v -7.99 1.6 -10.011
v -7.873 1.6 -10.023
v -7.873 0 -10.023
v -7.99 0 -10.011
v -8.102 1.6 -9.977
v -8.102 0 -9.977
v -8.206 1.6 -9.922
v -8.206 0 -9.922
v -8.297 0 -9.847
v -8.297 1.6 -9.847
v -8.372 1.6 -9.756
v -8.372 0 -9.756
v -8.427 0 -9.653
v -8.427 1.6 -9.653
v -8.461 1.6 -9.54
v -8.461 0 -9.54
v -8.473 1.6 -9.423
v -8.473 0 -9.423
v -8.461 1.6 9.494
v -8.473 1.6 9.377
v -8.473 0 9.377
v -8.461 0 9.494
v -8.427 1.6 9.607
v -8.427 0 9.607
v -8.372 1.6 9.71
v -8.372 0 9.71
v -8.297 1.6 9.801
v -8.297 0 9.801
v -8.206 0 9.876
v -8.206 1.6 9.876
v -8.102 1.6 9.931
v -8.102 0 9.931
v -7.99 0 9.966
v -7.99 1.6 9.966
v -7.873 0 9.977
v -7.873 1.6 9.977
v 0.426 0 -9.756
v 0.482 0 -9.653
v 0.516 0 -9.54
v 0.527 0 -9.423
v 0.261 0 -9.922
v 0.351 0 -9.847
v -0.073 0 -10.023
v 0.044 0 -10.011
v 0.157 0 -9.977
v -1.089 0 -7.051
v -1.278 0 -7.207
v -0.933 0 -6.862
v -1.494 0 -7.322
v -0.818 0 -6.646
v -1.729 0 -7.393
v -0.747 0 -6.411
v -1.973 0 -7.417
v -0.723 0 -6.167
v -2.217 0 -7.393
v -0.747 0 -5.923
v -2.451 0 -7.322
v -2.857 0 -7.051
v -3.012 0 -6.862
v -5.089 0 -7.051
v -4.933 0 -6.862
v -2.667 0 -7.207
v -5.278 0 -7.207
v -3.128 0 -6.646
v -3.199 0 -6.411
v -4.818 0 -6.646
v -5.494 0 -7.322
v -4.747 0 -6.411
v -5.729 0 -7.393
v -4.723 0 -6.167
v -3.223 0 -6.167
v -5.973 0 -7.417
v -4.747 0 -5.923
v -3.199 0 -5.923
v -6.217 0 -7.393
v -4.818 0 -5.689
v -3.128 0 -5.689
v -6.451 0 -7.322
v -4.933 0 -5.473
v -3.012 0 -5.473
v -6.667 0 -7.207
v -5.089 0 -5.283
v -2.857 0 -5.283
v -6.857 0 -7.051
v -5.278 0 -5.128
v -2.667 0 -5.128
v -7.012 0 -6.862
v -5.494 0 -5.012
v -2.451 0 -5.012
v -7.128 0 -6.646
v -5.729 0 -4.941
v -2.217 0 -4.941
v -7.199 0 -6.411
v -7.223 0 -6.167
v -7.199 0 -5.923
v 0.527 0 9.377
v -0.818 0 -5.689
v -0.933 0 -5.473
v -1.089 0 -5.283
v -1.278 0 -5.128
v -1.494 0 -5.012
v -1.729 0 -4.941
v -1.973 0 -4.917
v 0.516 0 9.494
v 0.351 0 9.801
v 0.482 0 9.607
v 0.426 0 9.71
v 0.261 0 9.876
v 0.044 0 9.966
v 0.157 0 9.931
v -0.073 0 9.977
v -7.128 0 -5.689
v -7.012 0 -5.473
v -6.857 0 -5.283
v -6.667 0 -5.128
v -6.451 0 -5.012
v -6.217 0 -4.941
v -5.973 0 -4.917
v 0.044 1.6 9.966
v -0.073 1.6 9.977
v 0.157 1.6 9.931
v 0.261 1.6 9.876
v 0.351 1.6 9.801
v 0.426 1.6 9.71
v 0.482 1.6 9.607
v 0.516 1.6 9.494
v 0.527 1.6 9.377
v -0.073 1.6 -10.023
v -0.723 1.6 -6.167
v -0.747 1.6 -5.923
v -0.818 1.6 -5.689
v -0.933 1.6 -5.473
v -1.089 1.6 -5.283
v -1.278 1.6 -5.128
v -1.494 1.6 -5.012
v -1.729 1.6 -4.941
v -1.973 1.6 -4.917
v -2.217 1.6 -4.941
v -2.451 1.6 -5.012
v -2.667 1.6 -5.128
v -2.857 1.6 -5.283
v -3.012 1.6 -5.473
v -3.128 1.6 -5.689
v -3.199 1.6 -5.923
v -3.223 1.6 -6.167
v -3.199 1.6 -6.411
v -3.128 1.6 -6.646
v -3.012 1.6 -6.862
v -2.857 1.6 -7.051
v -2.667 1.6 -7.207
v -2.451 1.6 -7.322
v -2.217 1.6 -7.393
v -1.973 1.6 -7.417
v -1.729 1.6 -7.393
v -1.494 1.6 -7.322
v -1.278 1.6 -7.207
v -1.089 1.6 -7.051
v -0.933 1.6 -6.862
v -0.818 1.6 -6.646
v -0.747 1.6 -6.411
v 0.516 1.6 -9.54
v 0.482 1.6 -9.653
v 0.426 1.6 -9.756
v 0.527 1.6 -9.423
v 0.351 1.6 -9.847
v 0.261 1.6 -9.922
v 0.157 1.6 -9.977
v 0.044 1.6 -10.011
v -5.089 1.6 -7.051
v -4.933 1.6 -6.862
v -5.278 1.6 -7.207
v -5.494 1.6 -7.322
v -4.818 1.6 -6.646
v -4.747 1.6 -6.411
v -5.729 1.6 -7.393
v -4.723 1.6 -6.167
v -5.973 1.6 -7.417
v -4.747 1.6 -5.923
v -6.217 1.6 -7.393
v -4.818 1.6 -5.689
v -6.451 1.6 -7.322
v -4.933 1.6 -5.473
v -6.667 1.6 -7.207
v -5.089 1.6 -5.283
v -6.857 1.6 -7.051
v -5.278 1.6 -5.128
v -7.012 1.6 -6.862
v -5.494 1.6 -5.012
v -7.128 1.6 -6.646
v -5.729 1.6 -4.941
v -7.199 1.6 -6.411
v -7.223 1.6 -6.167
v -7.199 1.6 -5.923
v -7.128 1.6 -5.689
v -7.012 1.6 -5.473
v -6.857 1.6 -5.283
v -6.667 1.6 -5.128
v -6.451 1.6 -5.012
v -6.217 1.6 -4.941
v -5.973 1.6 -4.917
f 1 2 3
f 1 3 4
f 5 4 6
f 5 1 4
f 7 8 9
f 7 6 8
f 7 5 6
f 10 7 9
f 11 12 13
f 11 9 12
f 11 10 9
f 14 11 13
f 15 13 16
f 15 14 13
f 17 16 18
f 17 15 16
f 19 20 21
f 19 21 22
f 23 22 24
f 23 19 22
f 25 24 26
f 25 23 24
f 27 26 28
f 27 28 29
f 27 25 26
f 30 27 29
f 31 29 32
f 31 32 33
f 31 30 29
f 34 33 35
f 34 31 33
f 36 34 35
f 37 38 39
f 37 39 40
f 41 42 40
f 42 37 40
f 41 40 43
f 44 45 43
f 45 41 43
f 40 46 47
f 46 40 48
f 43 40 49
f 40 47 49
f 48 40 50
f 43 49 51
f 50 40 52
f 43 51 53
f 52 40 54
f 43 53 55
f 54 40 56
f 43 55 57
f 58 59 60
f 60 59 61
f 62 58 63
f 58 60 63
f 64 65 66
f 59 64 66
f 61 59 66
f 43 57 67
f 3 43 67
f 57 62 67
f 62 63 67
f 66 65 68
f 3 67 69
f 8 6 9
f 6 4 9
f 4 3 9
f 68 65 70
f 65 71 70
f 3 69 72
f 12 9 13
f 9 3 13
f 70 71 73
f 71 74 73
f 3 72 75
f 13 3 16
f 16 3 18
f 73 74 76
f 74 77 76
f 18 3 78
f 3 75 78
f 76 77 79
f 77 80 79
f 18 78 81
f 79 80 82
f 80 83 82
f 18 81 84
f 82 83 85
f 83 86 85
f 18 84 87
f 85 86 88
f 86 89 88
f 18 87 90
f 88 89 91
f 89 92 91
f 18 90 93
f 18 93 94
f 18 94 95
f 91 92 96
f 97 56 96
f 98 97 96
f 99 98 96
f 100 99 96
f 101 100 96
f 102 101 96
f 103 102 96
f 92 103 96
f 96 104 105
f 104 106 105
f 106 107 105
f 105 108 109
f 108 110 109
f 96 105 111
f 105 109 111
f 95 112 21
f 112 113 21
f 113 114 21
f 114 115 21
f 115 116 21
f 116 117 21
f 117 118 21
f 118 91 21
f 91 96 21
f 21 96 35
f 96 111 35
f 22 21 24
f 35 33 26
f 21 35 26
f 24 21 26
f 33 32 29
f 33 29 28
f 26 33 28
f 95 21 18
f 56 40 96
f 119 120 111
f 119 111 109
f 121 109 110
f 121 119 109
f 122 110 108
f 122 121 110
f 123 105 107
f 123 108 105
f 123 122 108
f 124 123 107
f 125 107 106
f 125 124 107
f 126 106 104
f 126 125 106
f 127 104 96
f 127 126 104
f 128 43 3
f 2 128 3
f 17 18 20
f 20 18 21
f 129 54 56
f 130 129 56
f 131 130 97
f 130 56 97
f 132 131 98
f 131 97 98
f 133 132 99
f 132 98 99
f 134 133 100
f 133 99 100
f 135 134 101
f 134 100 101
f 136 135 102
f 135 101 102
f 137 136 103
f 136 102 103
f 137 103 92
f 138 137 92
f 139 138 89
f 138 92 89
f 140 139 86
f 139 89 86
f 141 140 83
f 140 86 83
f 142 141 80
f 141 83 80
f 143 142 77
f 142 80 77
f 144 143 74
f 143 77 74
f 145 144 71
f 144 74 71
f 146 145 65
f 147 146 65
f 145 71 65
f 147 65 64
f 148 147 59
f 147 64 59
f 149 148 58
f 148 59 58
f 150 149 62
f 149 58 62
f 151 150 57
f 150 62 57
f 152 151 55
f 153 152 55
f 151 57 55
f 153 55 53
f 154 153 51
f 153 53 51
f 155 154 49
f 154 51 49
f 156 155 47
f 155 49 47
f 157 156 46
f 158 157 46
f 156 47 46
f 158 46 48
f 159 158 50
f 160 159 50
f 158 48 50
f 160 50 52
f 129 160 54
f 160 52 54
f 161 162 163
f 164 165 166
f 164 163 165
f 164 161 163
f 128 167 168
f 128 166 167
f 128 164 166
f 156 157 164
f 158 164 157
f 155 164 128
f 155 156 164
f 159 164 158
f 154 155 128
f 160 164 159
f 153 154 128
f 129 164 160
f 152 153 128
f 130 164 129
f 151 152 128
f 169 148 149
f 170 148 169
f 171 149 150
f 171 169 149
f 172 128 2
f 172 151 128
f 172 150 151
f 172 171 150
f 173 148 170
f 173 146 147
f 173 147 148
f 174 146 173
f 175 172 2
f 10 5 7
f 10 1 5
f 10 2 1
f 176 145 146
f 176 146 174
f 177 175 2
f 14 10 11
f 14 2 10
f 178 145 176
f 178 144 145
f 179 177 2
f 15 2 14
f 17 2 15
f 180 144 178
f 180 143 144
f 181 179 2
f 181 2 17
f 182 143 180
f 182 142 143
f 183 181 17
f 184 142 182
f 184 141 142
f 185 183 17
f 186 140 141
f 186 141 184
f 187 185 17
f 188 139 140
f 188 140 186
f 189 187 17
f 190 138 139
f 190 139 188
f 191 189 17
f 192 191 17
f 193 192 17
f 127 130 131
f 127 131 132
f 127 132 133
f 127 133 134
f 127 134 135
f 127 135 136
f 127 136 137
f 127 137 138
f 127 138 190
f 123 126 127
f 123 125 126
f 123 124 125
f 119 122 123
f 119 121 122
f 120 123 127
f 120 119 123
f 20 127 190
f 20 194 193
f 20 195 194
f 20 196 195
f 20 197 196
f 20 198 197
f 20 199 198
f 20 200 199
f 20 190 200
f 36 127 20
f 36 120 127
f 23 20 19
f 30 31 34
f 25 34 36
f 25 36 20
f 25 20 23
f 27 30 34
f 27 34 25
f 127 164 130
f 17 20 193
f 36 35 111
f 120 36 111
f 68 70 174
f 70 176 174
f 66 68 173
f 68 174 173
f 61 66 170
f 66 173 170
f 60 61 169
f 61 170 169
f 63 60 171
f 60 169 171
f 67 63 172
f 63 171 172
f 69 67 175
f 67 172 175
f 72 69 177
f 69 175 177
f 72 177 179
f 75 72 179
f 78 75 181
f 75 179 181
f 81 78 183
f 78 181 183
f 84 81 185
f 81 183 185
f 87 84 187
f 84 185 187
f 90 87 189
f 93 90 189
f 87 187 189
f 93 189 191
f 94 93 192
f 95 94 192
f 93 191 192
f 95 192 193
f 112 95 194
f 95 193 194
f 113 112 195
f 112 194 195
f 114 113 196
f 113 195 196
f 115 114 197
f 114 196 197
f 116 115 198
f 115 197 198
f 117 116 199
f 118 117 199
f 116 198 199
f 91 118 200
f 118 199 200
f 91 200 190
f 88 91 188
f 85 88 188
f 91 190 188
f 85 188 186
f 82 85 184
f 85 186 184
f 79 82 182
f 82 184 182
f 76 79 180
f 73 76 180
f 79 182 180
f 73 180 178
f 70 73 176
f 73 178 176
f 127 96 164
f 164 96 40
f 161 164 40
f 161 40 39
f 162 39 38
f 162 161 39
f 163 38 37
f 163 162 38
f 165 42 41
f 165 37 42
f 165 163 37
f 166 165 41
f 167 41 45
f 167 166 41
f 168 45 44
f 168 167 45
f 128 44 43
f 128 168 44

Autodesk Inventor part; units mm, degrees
ref_plane "YZ Plane" through (0, 0, 0) normal (1, 0, 0) x (0, 1, 0)
ref_plane "XZ Plane" through (0, 0, 0) normal (0, 1, 0) x (-1, 0, 0)
ref_plane "XY Plane" through (0, 0, 0) normal (0, 0, 1) x (1, 0, 0)
sketch "Szkic1" plane through (0, 0, 0) normal (0, 1, 0) x (-1, 0, 0)
  line L0 (8.4728, 9.9771) -> (-0.5272, 9.9771)
  line L1 (-0.5272, 9.9771) -> (-0.5272, -10.0229)
  line L2 (-0.5272, -10.0229) -> (8.4728, -10.0229)
  line L3 (8.4728, -10.0229) -> (8.4728, 9.9771)
  point P0 (0, 0)
  dimension "d0" = 9
  dimension "d1" = 20
extrude "Wyciągnięcie proste1" add sketch "Szkic1" along normal blind 1.6
fillet "Zaokrąglenie1" radius 0.6 4 edges at (-8.4728, 0.8, -10.0229) (0.5272, 0.8, -10.0229) (0.5272, 0.8, 9.9771) (-8.4728, 0.8, 9.9771)
sketch "Szkic2" plane through (0, 0, 0) normal (0, -1, 0) x (1, 0, 0)
  circle A0 centre (-1.9728, -6.1673) radius 0.75 projected
  circle A1 centre (-1.9728, -6.1673) radius 1.25
  point P0 (0, 0)
  dimension "d5" = 2.5
extrude "Wyciągnięcie proste2" cut sketch "Szkic2" against normal through all contours A0 | A1
sketch "Szkic4" plane through (0, 1.6, 0) normal (0, 1, 0) x (1, 0, 0)
  line L0 (-0.0728, 10.0229) -> (-7.8728, 10.0229) projected
  circle A0 centre (-1.9728, 6.1673) radius 1.25 projected
  line L1 (-3.9728, 10.0229) -> (-3.9728, -9.9771)
  line L2 (-7.8728, -9.9771) -> (-0.0728, -9.9771) projected
  circle A1 centre (-5.9728, 6.1673) radius 1.25
  point P0 (0, 0)
extrude "Wyciągnięcie proste3" cut sketch "Szkic4" against normal blind 10 contours A1
sketch "Szkic5" plane through (0, 1.6, 0) normal (0, 1, 0) x (1, 0, 0)
  circle A0 centre (-5.9728, 6.1673) radius 1.25 projected
  circle A1 centre (-1.9728, 6.1673) radius 1.25 projected
  arc A2 (-8.4728, -9.3771) -> (-7.8728, -9.9771) centre (-7.8728, -9.3771) ccw projected
  line L0 (-7.8728, -9.9771) -> (-0.0728, -9.9771) projected
  arc A3 (-0.0728, -9.9771) -> (0.5272, -9.3771) centre (-0.0728, -9.3771) ccw projected
  line L1 (0.5272, -9.3771) -> (0.5272, 9.4229) projected
  arc A4 (0.5272, 9.4229) -> (-0.0728, 10.0229) centre (-0.0728, 9.4229) ccw projected
  line L2 (-0.0728, 10.0229) -> (-7.8728, 10.0229) projected
  arc A5 (-7.8728, 10.0229) -> (-8.4728, 9.4229) centre (-7.8728, 9.4229) ccw projected
  line L3 (-8.4728, 9.4229) -> (-8.4728, -9.3771) projected
  point P0 (0, 0)
properties part number "pcb_czujnik"
